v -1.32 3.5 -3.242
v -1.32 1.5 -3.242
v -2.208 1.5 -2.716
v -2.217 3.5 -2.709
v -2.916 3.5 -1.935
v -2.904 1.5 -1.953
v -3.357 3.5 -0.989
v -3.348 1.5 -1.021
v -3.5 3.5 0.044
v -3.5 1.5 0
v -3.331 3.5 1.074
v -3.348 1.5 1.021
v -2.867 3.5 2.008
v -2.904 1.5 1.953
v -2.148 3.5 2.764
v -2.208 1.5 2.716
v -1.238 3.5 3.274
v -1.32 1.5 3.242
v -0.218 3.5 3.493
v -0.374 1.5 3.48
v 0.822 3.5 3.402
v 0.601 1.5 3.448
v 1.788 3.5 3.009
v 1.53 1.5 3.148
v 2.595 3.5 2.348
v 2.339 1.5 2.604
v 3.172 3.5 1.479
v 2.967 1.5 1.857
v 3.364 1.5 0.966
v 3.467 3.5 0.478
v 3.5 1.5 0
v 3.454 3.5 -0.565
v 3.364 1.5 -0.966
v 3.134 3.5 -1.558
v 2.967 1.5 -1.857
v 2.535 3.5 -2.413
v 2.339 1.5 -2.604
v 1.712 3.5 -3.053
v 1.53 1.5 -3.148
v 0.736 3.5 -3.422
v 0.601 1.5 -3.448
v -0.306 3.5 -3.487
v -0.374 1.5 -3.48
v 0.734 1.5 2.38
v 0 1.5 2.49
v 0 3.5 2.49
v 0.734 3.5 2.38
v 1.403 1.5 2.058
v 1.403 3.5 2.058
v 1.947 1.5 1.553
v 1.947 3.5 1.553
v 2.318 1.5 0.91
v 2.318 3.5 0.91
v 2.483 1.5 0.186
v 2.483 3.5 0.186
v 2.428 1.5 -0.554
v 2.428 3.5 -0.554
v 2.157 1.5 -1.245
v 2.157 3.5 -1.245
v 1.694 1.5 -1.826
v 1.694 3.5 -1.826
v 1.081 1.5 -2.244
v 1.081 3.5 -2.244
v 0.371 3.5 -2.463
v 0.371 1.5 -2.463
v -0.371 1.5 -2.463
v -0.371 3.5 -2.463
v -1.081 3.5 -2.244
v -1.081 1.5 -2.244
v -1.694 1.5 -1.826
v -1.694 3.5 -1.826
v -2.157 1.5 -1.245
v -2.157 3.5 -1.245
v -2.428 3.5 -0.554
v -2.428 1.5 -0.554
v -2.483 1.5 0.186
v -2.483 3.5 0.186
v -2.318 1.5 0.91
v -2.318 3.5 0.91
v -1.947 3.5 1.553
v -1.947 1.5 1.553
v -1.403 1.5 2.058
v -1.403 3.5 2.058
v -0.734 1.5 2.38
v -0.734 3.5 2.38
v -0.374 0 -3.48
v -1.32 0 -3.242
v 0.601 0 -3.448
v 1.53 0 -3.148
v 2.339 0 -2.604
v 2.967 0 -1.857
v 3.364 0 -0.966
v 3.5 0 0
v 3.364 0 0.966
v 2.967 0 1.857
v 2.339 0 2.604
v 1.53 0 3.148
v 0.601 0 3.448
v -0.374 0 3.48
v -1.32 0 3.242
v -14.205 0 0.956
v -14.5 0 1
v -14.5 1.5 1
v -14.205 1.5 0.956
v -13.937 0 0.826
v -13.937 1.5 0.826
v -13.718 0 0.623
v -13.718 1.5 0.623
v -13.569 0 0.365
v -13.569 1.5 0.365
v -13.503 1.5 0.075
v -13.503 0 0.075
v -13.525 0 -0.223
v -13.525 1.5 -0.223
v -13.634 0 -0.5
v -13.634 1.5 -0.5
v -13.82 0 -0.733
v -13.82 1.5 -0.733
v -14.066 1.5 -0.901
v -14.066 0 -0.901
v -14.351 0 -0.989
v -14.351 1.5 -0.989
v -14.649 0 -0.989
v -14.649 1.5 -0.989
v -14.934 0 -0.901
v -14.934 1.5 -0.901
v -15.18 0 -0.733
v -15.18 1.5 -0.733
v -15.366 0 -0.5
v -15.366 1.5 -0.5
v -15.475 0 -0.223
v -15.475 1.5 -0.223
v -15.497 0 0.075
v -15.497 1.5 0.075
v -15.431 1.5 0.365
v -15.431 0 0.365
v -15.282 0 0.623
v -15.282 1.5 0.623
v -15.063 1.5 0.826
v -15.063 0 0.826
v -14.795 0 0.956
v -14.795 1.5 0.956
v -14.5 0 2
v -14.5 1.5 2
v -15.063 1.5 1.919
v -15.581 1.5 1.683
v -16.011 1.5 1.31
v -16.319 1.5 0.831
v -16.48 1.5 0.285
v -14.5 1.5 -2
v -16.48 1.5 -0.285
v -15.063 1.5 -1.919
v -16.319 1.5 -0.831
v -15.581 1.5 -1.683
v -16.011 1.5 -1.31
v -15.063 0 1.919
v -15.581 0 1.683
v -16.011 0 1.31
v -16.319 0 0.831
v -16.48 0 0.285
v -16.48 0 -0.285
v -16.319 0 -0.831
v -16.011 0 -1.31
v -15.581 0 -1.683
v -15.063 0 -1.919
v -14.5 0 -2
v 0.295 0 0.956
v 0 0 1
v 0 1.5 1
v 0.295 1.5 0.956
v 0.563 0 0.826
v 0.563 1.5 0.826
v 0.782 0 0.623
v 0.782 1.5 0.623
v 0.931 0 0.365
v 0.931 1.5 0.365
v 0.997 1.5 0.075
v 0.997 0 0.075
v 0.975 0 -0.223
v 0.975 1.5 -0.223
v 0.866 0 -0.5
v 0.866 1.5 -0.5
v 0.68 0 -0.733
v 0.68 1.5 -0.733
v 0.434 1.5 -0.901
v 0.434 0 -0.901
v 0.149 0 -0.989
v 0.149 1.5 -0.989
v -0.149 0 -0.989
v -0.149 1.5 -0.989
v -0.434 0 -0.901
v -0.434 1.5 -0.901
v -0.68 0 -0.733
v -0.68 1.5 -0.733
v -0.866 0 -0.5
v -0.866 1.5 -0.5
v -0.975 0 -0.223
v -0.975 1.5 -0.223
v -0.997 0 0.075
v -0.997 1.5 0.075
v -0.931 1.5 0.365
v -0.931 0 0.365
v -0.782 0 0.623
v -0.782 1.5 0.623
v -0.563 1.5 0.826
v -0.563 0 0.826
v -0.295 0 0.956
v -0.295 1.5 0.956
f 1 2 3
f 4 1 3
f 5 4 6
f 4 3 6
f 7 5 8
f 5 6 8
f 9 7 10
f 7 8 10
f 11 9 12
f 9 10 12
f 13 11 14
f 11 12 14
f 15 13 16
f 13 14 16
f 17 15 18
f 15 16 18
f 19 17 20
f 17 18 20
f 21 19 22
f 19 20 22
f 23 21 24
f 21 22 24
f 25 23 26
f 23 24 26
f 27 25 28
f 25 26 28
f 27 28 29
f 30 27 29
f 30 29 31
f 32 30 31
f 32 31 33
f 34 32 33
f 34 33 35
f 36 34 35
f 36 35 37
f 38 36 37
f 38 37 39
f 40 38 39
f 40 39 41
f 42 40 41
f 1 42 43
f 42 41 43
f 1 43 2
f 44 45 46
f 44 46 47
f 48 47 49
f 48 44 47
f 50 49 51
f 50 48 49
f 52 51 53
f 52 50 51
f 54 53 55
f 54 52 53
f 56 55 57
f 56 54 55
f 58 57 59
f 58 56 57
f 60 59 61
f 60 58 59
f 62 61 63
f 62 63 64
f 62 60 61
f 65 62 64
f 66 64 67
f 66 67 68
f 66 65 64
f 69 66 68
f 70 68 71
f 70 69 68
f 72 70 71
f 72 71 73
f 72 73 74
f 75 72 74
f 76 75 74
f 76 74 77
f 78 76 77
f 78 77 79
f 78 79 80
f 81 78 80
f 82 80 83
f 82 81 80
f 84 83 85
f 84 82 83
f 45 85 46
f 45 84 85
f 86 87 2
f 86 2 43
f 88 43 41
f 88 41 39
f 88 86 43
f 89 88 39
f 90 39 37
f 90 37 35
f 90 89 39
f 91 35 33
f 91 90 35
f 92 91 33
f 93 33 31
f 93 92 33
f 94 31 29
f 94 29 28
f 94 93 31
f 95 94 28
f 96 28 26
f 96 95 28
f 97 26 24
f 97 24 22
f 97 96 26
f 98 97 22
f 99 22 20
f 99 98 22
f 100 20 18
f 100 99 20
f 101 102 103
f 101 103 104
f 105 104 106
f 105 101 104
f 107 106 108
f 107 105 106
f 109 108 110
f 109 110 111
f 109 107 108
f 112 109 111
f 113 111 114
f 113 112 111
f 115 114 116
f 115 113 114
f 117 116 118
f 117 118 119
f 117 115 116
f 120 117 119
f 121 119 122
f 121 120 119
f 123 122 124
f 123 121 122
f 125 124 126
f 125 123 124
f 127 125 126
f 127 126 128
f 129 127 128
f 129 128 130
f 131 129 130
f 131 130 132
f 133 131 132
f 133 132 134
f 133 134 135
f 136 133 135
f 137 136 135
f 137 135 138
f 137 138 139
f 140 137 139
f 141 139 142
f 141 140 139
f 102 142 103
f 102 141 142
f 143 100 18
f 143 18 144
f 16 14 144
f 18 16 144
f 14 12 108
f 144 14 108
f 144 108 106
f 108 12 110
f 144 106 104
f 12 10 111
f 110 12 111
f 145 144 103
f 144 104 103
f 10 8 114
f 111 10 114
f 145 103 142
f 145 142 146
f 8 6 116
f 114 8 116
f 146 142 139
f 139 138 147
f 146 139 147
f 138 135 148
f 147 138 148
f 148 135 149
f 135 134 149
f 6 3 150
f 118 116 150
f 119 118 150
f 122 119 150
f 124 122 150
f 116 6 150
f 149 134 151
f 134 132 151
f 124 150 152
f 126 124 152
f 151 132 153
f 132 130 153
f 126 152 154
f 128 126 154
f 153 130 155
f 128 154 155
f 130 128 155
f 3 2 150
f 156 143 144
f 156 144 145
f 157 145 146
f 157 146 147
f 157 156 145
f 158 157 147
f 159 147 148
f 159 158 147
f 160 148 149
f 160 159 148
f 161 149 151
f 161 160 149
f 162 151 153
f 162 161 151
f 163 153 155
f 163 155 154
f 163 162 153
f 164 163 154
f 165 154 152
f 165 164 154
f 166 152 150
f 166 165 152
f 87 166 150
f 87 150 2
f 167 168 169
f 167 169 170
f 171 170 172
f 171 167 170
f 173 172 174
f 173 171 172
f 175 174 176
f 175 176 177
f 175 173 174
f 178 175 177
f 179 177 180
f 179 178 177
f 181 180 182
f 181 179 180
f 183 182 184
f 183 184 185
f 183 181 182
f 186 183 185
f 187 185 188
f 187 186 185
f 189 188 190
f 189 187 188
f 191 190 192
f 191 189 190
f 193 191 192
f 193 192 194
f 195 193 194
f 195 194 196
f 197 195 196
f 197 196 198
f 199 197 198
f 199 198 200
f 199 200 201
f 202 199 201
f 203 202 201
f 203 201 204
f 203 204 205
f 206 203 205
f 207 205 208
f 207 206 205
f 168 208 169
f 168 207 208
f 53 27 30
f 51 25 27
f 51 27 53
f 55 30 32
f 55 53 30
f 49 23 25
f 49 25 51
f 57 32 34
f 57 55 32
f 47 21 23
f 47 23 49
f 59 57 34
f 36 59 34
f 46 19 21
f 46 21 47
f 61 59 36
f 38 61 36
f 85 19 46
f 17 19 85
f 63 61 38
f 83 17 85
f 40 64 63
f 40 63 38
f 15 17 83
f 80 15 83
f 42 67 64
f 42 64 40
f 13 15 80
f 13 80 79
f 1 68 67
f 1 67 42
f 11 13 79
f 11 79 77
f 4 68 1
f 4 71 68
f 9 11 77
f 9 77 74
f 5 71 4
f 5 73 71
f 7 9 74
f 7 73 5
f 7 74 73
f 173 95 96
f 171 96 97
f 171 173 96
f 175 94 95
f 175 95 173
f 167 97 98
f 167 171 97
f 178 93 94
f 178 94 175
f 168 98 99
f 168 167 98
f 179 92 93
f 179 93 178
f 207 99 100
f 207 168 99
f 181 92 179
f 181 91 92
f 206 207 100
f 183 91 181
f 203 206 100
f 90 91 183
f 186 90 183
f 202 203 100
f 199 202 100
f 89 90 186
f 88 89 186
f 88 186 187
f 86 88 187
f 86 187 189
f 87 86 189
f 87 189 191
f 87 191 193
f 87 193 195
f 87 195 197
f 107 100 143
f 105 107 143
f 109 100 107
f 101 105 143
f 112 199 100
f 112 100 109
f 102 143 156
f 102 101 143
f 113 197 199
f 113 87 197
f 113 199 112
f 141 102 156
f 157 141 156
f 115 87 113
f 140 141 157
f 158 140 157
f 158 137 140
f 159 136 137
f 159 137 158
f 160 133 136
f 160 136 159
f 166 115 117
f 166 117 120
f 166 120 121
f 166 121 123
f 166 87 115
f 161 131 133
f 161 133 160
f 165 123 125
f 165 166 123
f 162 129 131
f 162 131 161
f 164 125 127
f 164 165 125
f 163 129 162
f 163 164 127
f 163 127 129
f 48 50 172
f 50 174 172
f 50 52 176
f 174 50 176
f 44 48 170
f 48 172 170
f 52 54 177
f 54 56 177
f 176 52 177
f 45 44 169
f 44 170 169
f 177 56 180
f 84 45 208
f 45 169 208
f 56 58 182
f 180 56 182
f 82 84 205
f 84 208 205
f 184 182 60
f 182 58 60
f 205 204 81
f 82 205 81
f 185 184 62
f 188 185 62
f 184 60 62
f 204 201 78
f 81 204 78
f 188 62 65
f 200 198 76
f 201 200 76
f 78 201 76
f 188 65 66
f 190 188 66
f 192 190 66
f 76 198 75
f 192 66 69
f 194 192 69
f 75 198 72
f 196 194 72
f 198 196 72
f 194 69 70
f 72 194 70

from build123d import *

# Parameters (mm, degrees)
SKETCH_1_R      = 1
EXTRUDE_1_DEPTH = 1.5
SKETCH_3_R      = 3.5
SKETCH_3_R_2    = 2.490413186
EXTRUDE_2_DEPTH = 2


with BuildPart() as part:
    # 草图1 → 凸台-拉伸1 (new body)
    with BuildSketch(Plane(origin=(0, 0, 0), x_dir=(1, 0, 0), z_dir=(0, 1, 0))):
        with BuildLine():
            Line((-14.5, 2), (-1.319677425, 3.241674181))
            ThreePointArc((-1.319677425, 3.241674181), (3.5, 0), (-1.319677425, -3.241674181))
            Line((-1.319677425, -3.241674181), (-14.5, -2))
            ThreePointArc((-14.5, -2), (-16.5, 0), (-14.5, 2))
        make_face()
        with Locations(Location((-14.5, 0, 0), (0, 0, 270))):
            Circle(SKETCH_1_R, mode=Mode.SUBTRACT)
        with Locations(Location((0, 0, 0), (0, 0, 270))):
            Circle(SKETCH_1_R, mode=Mode.SUBTRACT)
    extrude(amount=EXTRUDE_1_DEPTH)

    # 草图3 → 凸台-拉伸2 (add)
    with BuildSketch(Plane(origin=(0, 1.5, 0), x_dir=(1, 0, 0), z_dir=(0, 1, 0))):
        with Locations(Location((0, 0, 0), (0, 0, 112.151115012))):
            Circle(SKETCH_3_R)
        with Locations(Location((0, 0, 0), (0, 0, 270))):
            Circle(SKETCH_3_R_2, mode=Mode.SUBTRACT)
    extrude(amount=EXTRUDE_2_DEPTH)


solid = part.part
